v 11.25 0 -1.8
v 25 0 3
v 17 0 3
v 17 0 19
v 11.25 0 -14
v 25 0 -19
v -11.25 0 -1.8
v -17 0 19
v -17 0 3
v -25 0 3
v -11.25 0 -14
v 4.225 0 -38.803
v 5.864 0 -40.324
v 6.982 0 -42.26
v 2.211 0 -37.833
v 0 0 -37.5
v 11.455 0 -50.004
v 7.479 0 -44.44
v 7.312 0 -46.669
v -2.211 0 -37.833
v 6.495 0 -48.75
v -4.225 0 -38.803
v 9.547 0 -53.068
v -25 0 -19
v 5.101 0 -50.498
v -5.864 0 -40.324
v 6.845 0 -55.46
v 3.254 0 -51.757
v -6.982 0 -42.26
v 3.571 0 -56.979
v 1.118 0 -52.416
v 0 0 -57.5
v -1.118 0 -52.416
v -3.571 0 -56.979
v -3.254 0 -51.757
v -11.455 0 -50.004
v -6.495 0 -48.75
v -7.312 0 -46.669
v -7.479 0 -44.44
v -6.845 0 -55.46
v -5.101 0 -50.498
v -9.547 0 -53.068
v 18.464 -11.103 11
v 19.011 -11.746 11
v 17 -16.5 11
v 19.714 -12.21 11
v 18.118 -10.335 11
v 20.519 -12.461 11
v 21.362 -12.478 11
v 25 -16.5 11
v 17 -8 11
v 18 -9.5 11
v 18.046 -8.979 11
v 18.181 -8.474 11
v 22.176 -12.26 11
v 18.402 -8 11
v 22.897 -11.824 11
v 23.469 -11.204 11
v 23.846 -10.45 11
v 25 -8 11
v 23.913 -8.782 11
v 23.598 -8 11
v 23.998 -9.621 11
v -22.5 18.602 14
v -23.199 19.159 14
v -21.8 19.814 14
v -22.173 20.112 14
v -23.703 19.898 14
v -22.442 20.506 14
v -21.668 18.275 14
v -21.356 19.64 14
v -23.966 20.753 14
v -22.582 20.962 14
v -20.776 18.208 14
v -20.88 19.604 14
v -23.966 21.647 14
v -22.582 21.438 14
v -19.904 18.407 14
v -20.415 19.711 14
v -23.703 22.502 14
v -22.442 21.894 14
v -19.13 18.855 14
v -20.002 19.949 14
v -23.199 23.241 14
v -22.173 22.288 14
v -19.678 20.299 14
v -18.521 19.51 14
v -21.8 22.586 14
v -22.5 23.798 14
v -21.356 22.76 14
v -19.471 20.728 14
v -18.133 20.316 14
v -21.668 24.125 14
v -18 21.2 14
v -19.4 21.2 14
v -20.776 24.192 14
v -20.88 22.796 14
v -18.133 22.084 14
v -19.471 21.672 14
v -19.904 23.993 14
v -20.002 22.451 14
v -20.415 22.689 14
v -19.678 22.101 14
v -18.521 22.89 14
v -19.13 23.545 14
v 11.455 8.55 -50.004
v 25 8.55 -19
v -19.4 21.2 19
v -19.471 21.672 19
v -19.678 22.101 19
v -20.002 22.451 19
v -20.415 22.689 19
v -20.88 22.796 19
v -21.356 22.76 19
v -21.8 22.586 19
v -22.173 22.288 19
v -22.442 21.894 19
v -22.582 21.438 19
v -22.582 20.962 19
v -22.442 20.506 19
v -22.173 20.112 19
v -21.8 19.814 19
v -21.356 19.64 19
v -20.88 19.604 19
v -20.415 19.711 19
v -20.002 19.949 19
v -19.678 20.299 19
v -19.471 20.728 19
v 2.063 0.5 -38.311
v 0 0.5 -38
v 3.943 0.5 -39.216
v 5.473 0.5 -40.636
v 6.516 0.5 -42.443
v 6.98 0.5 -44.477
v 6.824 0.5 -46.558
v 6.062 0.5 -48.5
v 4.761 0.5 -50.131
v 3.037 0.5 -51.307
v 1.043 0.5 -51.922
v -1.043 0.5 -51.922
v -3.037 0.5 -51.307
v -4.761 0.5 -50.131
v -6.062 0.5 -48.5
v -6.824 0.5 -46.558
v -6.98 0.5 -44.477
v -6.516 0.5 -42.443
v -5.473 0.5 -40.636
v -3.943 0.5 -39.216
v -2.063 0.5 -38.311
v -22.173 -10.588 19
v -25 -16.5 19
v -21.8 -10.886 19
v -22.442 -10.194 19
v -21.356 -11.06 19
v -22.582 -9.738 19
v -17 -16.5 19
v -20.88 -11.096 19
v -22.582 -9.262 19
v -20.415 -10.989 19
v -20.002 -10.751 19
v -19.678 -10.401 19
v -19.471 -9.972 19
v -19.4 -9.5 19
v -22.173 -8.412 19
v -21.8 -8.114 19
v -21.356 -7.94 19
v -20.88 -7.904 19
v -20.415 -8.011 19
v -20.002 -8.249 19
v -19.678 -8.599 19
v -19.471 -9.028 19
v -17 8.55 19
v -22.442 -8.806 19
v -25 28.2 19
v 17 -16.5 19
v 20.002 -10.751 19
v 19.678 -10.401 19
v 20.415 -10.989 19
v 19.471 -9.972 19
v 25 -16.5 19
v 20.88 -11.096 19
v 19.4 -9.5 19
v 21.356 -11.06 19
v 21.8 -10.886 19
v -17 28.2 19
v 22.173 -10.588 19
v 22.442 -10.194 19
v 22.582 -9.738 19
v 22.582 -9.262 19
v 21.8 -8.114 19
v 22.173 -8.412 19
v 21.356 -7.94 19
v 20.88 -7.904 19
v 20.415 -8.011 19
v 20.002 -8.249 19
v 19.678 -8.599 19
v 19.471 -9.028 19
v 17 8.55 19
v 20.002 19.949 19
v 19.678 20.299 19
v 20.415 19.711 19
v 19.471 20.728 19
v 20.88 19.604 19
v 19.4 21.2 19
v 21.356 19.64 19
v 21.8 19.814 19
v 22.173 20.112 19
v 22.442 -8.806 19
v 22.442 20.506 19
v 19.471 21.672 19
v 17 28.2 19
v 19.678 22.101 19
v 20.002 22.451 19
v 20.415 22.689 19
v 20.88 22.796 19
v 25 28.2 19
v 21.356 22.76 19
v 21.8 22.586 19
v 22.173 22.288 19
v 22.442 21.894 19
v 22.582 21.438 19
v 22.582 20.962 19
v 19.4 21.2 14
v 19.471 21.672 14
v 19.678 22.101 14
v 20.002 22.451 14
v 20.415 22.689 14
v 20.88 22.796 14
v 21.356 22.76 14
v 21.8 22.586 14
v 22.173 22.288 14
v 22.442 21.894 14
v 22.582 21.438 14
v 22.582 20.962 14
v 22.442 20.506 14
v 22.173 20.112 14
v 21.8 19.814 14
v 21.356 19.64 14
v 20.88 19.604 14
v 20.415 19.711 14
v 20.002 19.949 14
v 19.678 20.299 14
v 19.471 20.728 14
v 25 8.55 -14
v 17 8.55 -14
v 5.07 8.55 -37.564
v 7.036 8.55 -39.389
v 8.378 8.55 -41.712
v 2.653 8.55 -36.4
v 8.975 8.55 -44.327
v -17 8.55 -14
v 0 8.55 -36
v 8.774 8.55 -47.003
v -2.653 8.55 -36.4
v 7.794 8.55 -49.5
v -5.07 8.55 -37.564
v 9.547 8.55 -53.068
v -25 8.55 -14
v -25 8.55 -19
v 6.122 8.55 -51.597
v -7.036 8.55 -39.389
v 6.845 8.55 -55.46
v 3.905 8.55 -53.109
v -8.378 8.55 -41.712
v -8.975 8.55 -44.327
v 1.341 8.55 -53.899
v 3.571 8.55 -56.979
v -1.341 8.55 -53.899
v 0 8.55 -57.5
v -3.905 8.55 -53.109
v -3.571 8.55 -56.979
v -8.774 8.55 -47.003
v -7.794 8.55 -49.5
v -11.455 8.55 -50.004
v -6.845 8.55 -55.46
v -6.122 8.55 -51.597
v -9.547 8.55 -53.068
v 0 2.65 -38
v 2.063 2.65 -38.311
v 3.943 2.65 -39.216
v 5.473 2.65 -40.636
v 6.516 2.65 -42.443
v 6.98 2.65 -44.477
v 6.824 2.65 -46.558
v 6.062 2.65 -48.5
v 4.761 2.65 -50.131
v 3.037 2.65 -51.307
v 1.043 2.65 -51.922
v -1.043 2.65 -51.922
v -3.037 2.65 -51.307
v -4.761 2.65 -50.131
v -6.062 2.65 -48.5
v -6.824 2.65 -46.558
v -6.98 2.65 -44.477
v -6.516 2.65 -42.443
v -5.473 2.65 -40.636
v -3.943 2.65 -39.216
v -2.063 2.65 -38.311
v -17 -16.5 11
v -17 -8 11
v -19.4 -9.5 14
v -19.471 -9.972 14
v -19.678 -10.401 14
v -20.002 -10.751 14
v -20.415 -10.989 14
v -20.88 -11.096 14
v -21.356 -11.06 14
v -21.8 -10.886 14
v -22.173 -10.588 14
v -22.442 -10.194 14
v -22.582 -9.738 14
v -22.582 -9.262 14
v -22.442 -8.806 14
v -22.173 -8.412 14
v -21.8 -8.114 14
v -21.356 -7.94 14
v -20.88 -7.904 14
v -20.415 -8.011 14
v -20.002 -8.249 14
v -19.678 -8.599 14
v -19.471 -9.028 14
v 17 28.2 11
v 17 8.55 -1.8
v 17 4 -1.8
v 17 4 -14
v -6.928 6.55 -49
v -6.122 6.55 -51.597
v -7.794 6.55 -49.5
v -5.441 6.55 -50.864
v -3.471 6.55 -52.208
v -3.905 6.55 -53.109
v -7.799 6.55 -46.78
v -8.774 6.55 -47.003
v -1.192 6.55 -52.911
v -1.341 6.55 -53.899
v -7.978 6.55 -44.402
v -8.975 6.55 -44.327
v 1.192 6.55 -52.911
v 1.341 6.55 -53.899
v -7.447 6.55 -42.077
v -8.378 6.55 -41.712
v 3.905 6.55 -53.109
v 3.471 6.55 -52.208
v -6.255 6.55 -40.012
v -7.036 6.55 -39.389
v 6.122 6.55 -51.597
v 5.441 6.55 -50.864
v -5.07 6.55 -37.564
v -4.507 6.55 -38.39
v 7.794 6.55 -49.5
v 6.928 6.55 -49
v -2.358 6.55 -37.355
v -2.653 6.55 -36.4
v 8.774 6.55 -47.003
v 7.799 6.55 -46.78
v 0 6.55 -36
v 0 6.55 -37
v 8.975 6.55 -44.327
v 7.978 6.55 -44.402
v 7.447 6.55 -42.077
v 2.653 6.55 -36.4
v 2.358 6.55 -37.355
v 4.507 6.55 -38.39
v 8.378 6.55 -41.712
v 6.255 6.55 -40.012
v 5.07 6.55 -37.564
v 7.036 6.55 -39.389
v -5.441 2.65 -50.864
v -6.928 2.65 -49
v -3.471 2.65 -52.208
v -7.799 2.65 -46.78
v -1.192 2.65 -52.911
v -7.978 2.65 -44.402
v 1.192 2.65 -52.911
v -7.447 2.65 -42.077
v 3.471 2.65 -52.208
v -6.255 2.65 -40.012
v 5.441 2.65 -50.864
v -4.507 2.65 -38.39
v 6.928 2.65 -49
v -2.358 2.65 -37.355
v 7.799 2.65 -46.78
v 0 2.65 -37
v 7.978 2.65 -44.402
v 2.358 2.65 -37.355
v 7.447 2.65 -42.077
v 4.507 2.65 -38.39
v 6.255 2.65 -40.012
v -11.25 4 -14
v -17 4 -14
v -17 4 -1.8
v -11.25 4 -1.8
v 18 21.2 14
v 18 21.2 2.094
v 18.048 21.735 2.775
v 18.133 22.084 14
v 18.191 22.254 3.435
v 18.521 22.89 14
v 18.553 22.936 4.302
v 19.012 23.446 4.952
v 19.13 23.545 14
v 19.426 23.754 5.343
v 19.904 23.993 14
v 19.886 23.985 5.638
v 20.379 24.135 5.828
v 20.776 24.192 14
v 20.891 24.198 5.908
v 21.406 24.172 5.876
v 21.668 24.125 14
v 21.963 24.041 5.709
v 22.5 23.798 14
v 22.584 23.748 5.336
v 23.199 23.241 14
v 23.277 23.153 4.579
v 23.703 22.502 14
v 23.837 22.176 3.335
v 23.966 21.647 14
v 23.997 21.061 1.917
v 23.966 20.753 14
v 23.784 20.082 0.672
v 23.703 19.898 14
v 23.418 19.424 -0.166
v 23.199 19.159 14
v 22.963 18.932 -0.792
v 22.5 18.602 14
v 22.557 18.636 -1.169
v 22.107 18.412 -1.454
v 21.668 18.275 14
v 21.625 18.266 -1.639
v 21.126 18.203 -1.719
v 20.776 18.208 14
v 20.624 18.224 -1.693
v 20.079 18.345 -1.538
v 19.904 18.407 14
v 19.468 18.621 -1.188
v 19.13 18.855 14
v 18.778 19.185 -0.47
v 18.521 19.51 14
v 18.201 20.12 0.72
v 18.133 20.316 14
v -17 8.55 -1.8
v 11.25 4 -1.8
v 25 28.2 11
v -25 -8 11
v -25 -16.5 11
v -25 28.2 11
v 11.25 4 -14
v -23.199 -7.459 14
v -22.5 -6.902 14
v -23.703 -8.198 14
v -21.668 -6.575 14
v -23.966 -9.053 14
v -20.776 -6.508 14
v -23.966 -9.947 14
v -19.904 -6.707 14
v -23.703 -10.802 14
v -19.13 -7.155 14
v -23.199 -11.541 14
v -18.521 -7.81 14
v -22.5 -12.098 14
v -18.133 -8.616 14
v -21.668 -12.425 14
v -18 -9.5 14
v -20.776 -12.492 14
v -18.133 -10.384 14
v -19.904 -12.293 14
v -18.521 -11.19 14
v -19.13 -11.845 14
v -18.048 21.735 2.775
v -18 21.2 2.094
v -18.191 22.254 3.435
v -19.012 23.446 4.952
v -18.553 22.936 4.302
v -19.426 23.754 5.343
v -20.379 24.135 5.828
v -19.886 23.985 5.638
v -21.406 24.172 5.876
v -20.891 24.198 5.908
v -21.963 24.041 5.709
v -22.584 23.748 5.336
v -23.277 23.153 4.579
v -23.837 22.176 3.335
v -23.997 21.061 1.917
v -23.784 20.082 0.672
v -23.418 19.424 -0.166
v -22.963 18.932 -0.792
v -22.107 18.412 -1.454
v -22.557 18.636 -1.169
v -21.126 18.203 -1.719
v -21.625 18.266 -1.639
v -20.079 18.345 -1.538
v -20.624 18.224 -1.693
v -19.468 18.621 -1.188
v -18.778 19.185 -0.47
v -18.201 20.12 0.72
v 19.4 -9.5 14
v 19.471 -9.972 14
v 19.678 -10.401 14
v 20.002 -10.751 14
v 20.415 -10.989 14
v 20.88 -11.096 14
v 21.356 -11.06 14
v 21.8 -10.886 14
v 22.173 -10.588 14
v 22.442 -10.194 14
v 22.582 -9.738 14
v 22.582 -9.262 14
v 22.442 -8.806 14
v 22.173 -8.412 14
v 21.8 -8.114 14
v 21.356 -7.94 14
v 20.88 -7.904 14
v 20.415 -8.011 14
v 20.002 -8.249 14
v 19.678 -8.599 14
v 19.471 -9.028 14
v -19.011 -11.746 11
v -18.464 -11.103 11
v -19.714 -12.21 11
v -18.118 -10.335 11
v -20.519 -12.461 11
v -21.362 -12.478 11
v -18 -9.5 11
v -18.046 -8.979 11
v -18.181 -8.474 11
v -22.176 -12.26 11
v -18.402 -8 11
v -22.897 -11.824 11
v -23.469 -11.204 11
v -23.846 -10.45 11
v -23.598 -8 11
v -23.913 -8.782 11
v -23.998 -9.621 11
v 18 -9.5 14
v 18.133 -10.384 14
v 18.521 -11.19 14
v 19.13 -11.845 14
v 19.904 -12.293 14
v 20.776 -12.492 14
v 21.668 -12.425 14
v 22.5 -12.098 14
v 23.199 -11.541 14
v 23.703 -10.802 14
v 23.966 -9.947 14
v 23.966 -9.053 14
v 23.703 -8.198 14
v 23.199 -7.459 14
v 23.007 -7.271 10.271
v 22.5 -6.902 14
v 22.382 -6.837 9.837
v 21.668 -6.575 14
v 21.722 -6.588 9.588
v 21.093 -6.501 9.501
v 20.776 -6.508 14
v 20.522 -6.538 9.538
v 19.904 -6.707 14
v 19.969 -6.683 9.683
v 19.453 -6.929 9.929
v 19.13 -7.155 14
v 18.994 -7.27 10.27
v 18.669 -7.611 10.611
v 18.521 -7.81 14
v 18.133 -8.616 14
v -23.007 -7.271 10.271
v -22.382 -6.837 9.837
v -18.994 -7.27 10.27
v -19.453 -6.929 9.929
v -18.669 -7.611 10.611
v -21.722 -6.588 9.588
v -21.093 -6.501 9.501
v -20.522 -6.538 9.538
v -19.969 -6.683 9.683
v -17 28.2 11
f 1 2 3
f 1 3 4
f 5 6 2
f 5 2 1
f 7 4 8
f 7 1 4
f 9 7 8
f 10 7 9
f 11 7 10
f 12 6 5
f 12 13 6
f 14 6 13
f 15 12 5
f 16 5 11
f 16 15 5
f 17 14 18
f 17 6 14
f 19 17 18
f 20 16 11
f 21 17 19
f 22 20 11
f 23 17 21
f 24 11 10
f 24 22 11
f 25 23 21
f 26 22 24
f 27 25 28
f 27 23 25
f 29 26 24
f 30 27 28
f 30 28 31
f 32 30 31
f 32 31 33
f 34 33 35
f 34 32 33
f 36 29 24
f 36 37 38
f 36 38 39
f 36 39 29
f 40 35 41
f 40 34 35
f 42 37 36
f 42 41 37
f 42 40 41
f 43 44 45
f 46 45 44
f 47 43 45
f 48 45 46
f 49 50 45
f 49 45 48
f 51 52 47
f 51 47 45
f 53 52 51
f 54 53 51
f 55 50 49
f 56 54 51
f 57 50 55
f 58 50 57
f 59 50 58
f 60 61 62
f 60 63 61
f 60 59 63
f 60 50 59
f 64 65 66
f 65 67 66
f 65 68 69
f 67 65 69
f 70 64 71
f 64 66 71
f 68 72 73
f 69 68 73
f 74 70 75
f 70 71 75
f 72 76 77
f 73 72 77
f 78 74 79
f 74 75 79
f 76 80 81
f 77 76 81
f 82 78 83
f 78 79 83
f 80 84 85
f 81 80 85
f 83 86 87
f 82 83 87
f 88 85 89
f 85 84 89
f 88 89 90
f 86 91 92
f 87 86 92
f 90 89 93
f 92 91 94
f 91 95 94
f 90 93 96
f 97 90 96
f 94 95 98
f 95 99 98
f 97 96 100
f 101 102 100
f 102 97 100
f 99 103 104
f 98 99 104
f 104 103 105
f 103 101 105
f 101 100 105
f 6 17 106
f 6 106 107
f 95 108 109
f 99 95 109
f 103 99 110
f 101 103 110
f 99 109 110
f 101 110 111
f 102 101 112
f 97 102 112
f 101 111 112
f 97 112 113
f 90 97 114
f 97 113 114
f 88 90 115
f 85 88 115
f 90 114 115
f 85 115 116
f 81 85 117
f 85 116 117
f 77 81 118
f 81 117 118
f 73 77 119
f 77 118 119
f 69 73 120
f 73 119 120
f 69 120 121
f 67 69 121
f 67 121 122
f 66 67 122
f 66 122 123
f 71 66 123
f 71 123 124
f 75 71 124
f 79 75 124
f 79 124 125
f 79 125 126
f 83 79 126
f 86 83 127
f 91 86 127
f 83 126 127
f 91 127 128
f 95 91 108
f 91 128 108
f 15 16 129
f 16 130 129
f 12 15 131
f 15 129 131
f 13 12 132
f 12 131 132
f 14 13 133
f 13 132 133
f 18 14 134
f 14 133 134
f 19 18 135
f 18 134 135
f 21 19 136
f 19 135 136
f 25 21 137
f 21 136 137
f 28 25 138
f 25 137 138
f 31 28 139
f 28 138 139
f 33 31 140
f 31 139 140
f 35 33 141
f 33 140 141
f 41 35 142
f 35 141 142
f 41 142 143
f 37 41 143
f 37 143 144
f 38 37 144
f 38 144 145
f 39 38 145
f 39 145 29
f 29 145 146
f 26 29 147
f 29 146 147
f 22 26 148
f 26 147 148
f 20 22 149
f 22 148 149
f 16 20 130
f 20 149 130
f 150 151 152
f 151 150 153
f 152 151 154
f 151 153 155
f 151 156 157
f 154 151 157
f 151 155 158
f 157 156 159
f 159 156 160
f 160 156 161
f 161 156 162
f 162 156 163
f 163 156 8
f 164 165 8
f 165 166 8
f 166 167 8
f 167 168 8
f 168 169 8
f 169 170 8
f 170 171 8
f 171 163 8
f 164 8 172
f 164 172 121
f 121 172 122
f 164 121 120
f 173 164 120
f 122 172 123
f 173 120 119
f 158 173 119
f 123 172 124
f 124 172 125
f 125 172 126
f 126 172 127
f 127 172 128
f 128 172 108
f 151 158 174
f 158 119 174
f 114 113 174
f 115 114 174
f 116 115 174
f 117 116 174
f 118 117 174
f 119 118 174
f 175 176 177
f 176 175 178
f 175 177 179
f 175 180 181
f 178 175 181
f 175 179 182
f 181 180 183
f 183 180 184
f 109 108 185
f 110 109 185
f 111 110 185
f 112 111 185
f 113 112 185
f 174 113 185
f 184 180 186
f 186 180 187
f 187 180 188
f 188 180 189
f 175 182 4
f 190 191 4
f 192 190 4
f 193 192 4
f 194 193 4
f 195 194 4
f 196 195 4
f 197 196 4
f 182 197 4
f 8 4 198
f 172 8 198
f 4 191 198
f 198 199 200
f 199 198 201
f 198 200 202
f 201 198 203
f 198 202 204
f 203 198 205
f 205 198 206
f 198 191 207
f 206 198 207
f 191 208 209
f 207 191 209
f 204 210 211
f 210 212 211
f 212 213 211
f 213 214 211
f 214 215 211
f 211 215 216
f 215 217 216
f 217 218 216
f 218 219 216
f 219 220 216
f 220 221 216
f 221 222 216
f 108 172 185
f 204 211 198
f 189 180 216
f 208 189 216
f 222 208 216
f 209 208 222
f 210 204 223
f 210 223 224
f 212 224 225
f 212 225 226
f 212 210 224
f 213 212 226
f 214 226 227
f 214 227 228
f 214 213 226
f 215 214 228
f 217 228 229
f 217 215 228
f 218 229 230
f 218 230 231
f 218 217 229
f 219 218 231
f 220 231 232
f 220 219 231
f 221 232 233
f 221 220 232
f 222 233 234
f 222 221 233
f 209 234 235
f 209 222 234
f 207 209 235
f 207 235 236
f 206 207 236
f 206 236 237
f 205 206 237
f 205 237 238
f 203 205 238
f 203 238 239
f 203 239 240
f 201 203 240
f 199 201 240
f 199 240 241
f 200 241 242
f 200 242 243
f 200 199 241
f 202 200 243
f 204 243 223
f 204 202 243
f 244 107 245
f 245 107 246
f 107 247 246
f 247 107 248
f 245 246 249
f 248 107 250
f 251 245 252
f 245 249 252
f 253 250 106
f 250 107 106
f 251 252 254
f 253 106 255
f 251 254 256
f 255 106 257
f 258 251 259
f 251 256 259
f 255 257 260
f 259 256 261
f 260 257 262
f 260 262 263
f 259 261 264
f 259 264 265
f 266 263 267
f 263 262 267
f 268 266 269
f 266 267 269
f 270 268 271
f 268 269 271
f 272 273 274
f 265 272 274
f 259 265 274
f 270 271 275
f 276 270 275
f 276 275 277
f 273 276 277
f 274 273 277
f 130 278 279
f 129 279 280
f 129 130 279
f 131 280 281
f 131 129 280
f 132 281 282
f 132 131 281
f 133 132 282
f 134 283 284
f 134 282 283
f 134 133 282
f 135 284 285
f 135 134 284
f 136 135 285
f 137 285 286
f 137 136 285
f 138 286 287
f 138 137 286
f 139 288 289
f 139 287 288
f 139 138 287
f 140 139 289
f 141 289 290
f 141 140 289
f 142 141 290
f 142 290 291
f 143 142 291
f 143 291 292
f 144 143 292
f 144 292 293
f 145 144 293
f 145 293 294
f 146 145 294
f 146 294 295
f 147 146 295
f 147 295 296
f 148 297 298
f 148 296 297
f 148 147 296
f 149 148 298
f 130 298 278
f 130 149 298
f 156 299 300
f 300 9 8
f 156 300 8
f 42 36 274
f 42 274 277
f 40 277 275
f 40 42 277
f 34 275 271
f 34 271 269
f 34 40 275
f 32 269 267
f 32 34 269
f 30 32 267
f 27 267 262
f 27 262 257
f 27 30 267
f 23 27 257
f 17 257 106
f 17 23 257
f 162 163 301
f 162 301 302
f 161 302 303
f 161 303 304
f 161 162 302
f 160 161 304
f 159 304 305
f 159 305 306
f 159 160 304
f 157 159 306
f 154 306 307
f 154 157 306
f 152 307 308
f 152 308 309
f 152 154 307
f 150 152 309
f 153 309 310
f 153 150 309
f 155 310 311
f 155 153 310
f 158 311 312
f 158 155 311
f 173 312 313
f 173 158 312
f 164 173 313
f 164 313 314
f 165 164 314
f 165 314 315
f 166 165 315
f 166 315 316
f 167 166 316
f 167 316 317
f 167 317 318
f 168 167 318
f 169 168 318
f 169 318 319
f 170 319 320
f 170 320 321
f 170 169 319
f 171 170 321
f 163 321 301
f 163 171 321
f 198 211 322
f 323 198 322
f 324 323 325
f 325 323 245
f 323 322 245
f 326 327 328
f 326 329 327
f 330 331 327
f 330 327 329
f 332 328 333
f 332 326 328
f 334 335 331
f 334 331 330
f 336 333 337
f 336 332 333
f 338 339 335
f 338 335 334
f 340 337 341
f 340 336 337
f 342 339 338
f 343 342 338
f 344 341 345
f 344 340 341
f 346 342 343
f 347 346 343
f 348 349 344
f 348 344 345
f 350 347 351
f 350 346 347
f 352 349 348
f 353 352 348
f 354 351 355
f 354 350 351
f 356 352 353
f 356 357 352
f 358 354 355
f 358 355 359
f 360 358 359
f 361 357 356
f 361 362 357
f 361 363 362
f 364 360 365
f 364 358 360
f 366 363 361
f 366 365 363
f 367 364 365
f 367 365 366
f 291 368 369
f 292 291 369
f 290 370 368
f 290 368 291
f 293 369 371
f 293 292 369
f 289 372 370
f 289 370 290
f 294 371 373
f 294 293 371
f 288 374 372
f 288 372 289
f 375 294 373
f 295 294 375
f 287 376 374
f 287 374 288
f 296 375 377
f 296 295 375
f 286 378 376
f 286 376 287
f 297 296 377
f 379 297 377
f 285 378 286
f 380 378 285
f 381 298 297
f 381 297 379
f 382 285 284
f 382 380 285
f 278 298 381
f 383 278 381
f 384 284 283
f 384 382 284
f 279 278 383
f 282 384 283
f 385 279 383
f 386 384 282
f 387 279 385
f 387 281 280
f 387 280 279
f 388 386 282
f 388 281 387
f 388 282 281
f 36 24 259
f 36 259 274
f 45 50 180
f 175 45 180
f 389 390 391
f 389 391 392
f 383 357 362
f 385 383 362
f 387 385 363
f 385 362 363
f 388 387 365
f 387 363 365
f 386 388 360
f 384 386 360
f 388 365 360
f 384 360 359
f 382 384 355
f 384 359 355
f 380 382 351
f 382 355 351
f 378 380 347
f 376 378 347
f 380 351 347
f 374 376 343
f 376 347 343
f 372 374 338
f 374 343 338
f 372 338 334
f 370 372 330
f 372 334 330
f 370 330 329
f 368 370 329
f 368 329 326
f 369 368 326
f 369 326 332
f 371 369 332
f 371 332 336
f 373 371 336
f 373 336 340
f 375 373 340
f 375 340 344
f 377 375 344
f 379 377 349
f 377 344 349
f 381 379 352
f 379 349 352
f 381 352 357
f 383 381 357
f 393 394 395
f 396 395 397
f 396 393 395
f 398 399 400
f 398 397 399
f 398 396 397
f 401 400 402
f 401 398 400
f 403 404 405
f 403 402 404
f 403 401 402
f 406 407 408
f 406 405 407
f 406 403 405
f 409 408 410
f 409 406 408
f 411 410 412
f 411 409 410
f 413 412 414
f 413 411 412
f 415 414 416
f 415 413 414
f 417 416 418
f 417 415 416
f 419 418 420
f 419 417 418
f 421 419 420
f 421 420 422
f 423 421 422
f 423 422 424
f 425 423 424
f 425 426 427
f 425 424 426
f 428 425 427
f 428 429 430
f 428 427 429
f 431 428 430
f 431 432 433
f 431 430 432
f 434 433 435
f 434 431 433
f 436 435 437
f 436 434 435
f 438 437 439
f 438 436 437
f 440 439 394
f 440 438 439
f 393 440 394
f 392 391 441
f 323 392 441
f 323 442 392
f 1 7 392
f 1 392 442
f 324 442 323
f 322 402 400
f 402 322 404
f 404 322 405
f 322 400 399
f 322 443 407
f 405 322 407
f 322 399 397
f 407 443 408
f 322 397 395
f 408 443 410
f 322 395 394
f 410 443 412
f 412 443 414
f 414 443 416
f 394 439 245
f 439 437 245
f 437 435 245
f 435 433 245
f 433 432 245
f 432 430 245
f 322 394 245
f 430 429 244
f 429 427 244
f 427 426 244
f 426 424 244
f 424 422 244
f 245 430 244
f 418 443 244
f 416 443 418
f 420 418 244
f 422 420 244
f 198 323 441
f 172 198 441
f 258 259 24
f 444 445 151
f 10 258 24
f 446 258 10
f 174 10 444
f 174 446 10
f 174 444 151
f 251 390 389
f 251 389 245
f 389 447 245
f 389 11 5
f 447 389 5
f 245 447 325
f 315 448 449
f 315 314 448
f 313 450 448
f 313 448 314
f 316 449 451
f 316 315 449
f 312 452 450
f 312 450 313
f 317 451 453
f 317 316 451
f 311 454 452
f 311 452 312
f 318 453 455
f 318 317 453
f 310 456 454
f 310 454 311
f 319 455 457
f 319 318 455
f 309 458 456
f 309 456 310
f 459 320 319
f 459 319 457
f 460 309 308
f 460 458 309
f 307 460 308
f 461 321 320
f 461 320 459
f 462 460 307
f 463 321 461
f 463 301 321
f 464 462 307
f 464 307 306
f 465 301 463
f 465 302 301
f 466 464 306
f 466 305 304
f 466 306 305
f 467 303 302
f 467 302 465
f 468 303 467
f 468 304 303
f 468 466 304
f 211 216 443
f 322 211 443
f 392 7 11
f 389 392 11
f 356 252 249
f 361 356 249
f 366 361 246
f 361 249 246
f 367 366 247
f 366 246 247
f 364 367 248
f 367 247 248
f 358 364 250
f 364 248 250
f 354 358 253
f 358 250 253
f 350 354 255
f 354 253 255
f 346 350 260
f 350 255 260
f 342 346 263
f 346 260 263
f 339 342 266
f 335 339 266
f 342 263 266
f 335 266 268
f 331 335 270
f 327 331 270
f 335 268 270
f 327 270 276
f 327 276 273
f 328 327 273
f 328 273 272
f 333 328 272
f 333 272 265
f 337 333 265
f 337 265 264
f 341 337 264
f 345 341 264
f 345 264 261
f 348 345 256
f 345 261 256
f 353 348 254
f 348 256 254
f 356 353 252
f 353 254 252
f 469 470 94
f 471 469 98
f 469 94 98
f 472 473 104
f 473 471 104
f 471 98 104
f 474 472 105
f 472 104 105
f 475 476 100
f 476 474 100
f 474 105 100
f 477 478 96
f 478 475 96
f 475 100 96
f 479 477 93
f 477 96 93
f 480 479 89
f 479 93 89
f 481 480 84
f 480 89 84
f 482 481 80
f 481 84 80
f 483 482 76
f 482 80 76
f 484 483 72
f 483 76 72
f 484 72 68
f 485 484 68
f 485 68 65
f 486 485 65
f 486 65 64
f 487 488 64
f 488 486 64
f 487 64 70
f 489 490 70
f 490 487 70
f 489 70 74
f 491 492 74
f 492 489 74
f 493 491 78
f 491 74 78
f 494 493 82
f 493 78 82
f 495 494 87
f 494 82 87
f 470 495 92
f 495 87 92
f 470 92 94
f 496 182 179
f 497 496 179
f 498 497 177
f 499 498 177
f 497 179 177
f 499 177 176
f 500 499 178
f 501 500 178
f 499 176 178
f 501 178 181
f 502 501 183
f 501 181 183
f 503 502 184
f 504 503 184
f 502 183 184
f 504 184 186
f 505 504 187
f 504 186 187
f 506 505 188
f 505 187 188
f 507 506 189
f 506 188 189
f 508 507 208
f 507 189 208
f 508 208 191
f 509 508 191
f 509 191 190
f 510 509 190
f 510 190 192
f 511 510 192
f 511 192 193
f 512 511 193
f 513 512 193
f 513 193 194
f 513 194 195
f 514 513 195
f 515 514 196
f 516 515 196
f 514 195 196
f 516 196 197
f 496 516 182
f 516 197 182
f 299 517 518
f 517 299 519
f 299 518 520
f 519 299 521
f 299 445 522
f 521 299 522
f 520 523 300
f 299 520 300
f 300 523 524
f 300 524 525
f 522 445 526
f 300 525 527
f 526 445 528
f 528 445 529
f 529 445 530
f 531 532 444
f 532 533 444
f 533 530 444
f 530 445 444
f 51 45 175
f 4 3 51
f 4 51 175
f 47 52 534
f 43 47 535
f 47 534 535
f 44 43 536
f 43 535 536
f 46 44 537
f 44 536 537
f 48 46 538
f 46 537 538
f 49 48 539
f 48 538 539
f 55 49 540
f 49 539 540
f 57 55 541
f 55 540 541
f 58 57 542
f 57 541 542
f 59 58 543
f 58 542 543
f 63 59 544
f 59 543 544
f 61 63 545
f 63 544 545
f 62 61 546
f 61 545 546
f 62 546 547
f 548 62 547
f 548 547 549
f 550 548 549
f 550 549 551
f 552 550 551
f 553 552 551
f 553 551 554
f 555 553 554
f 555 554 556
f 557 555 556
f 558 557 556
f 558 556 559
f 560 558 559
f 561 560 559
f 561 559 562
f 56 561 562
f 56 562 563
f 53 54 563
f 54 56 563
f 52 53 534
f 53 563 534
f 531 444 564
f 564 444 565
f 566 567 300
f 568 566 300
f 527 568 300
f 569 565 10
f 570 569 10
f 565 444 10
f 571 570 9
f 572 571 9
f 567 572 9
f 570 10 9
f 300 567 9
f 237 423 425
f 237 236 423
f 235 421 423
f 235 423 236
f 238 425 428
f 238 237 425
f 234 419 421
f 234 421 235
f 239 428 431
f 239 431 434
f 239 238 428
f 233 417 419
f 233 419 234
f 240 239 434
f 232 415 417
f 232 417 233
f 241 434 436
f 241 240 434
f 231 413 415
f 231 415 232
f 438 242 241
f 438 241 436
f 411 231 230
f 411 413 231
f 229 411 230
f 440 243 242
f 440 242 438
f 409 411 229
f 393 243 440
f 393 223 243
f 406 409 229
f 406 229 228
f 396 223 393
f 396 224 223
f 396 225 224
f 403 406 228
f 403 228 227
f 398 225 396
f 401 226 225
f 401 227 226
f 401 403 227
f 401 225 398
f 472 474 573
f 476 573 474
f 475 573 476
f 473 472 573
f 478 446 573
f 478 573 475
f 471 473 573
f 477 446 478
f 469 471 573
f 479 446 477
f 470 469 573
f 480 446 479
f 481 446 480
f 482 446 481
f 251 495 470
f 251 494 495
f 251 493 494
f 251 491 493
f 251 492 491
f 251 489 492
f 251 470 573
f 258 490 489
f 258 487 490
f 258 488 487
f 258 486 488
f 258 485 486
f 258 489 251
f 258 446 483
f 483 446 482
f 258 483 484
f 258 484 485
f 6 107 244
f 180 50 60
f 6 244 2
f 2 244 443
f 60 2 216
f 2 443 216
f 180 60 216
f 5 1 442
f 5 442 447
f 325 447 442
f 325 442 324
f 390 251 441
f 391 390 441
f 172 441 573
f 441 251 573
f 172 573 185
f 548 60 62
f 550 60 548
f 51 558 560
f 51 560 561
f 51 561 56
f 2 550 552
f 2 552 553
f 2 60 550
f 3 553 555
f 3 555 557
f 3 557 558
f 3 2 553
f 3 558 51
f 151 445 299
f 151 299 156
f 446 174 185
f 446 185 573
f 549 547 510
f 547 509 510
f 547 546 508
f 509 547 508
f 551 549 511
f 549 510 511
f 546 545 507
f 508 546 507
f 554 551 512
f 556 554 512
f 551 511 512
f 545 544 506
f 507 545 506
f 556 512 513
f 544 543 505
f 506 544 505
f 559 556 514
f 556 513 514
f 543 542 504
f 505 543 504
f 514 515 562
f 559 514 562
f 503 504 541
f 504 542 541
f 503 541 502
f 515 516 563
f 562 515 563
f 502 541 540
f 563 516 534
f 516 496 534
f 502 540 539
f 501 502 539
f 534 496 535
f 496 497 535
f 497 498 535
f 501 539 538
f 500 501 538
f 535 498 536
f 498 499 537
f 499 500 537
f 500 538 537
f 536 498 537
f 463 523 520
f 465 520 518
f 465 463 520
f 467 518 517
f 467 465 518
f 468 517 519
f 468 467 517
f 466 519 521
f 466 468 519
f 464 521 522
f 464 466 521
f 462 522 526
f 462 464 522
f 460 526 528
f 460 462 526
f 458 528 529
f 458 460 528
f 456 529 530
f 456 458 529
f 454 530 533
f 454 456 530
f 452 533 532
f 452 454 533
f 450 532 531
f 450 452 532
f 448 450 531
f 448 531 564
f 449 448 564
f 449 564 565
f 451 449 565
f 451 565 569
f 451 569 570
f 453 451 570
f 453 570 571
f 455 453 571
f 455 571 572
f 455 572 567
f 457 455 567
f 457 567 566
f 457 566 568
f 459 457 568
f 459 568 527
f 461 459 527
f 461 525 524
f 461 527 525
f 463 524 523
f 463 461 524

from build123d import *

# Parameters (mm, degrees)
SKETCH1_R           = 7
SKETCH1_W           = 22.5
SKETCH1_H           = 12.2
BOSS_EXTRUDE1_DEPTH = 8.55
SKETCH2_W           = 34
SKETCH2_H           = 12.2
CUT_EXTRUDE1_DEPTH  = 4.55
SKETCH3_R           = 9
CUT_EXTRUDE2_DEPTH  = 2
SKETCH4_R           = 8
CUT_EXTRUDE3_DEPTH  = 3.9
CHAMFER1_SIZE       = 0.5
BOSS_EXTRUDE2_DEPTH = 8
SKETCH6_R           = 1.6
CUT_EXTRUDE4_DEPTH  = 5
CUT_EXTRUDE5_REACH  = 82.824
SKETCH7_R           = 3
SKETCH8_W           = 8
SKETCH8_H           = 16.5
BOSS_EXTRUDE3_DEPTH = 8
CHAMFER2_SIZE       = 8


# Read off the part's stored shape, not the designer's step: Mirror3
with BuildPart() as part:
    # Sketch1 → Boss-Extrude1 (new body)
    with BuildSketch(Plane(origin=(0, 0, 0), x_dir=(1, 0, 0), z_dir=(0, 1, 0))):
        with BuildLine():
            Line((-25, 19), (-11.454535097, 50.00436067))
            ThreePointArc((-11.454535097, 50.00436067), (0, 57.5), (11.454535097, 50.00436067))
            Line((11.454535097, 50.00436067), (25, 19))
            Line((25, 19), (25, -19))
            Line((25, -19), (-25, -19))
            Line((-25, -19), (-25, 19))
        make_face()
        with Locations(Location((0, 45, 0), (0, 0, 270))):
            Circle(SKETCH1_R, mode=Mode.SUBTRACT)
        with Locations((0, 7.9)):
            Rectangle(SKETCH1_W, SKETCH1_H, mode=Mode.SUBTRACT)
    extrude(amount=BOSS_EXTRUDE1_DEPTH)

    # Sketch2 → Cut-Extrude1 (cut)
    with BuildSketch(Plane(origin=(0, 8.55, 0), x_dir=(1, 0, 0), z_dir=(0, 1, 0))):
        with Locations((0, 7.9)):
            Rectangle(SKETCH2_W, SKETCH2_H)
    extrude(amount=-CUT_EXTRUDE1_DEPTH, mode=Mode.SUBTRACT)

    # Sketch3 → Cut-Extrude2 (cut)
    with BuildSketch(Plane(origin=(0, 8.55, 0), x_dir=(1, 0, 0), z_dir=(0, 1, 0))):
        with Locations(Location((0, 45, 0), (0, 0, 270))):
            Circle(SKETCH3_R)
    extrude(amount=-CUT_EXTRUDE2_DEPTH, mode=Mode.SUBTRACT)

    # Sketch4 → Cut-Extrude3 (cut)
    with BuildSketch(Plane(origin=(0, 6.55, 0), x_dir=(1, 0, 0), z_dir=(0, 1, 0))):
        with Locations(Location((0, 45, 0), (0, 0, 270))):
            Circle(SKETCH4_R)
    extrude(amount=-CUT_EXTRUDE3_DEPTH, mode=Mode.SUBTRACT)

    # Chamfer1
    chamfer1_edges = [part.edges().sort_by_distance(p)[0] for p in [
        (0, 0, -52),
    ]]
    chamfer(chamfer1_edges, length=CHAMFER1_SIZE)

    # Sketch5 → Boss-Extrude2 (add)
    with BuildSketch(Plane.ZY.offset(25)):
        Polygon((19, 8.55), (19, 28.2), (11, 28.2), (-14, 8.55), align=None)
    extrude(amount=-BOSS_EXTRUDE2_DEPTH)

    # Sketch6 → Cut-Extrude4 (cut)
    with BuildSketch(Plane.XY.offset(19)):
        with Locations((-21, 21.2)):
            Circle(SKETCH6_R)
    cut_extrude4 = extrude(amount=-CUT_EXTRUDE4_DEPTH, mode=Mode.SUBTRACT)

    # Cut-Extrude5: up to this plane
    cut_extrude5_end = Plane(origin=(-17, 28.2, 11), z_dir=(0, 0.7862091997273701, -0.617960430985713))
    # Sketch7 → Cut-Extrude5 (cut, up to the surface)
    with BuildSketch(Plane.XY.offset(14), mode=Mode.PRIVATE) as cut_extrude5_sk1:
        with Locations((-21, 21.2)):
            Circle(SKETCH7_R)
    cut_extrude5_tool1 = split(extrude(cut_extrude5_sk1.sketch, amount=-CUT_EXTRUDE5_REACH, mode=Mode.PRIVATE), bisect_by=cut_extrude5_end, keep=Keep.BOTH, mode=Mode.PRIVATE)
    cut_extrude5 = cut_extrude5_tool1.solids().sort_by_distance((-21, 21.2, 14))[0]
    add(cut_extrude5, mode=Mode.SUBTRACT)

    # Sketch8 → Boss-Extrude3 (add)
    with BuildSketch(Plane.ZY.offset(25)):
        with Locations((15, -8.25)):
            Rectangle(SKETCH8_W, SKETCH8_H)
    extrude(amount=-BOSS_EXTRUDE3_DEPTH)

    # Chamfer2
    chamfer2_edges = [part.edges().sort_by_distance(p)[0] for p in [
        (-21, 0, 11),
    ]]
    chamfer(chamfer2_edges, length=CHAMFER2_SIZE)

    # Mirror2: Cut-Extrude4, Cut-Extrude5 across plane
    add(cut_extrude4.mirror(Plane.ZX.offset(5.85)), mode=Mode.SUBTRACT)
    add(cut_extrude5.mirror(Plane.ZX.offset(5.85)), mode=Mode.SUBTRACT)

    # Mirror3: part across plane


with BuildPart() as part_1:
    add(part.part)
    add(part.part.mirror(Plane(origin=(0, 0, 0), x_dir=(0, 0, 1), z_dir=(1, 0, 0))))


solid = part_1.part
